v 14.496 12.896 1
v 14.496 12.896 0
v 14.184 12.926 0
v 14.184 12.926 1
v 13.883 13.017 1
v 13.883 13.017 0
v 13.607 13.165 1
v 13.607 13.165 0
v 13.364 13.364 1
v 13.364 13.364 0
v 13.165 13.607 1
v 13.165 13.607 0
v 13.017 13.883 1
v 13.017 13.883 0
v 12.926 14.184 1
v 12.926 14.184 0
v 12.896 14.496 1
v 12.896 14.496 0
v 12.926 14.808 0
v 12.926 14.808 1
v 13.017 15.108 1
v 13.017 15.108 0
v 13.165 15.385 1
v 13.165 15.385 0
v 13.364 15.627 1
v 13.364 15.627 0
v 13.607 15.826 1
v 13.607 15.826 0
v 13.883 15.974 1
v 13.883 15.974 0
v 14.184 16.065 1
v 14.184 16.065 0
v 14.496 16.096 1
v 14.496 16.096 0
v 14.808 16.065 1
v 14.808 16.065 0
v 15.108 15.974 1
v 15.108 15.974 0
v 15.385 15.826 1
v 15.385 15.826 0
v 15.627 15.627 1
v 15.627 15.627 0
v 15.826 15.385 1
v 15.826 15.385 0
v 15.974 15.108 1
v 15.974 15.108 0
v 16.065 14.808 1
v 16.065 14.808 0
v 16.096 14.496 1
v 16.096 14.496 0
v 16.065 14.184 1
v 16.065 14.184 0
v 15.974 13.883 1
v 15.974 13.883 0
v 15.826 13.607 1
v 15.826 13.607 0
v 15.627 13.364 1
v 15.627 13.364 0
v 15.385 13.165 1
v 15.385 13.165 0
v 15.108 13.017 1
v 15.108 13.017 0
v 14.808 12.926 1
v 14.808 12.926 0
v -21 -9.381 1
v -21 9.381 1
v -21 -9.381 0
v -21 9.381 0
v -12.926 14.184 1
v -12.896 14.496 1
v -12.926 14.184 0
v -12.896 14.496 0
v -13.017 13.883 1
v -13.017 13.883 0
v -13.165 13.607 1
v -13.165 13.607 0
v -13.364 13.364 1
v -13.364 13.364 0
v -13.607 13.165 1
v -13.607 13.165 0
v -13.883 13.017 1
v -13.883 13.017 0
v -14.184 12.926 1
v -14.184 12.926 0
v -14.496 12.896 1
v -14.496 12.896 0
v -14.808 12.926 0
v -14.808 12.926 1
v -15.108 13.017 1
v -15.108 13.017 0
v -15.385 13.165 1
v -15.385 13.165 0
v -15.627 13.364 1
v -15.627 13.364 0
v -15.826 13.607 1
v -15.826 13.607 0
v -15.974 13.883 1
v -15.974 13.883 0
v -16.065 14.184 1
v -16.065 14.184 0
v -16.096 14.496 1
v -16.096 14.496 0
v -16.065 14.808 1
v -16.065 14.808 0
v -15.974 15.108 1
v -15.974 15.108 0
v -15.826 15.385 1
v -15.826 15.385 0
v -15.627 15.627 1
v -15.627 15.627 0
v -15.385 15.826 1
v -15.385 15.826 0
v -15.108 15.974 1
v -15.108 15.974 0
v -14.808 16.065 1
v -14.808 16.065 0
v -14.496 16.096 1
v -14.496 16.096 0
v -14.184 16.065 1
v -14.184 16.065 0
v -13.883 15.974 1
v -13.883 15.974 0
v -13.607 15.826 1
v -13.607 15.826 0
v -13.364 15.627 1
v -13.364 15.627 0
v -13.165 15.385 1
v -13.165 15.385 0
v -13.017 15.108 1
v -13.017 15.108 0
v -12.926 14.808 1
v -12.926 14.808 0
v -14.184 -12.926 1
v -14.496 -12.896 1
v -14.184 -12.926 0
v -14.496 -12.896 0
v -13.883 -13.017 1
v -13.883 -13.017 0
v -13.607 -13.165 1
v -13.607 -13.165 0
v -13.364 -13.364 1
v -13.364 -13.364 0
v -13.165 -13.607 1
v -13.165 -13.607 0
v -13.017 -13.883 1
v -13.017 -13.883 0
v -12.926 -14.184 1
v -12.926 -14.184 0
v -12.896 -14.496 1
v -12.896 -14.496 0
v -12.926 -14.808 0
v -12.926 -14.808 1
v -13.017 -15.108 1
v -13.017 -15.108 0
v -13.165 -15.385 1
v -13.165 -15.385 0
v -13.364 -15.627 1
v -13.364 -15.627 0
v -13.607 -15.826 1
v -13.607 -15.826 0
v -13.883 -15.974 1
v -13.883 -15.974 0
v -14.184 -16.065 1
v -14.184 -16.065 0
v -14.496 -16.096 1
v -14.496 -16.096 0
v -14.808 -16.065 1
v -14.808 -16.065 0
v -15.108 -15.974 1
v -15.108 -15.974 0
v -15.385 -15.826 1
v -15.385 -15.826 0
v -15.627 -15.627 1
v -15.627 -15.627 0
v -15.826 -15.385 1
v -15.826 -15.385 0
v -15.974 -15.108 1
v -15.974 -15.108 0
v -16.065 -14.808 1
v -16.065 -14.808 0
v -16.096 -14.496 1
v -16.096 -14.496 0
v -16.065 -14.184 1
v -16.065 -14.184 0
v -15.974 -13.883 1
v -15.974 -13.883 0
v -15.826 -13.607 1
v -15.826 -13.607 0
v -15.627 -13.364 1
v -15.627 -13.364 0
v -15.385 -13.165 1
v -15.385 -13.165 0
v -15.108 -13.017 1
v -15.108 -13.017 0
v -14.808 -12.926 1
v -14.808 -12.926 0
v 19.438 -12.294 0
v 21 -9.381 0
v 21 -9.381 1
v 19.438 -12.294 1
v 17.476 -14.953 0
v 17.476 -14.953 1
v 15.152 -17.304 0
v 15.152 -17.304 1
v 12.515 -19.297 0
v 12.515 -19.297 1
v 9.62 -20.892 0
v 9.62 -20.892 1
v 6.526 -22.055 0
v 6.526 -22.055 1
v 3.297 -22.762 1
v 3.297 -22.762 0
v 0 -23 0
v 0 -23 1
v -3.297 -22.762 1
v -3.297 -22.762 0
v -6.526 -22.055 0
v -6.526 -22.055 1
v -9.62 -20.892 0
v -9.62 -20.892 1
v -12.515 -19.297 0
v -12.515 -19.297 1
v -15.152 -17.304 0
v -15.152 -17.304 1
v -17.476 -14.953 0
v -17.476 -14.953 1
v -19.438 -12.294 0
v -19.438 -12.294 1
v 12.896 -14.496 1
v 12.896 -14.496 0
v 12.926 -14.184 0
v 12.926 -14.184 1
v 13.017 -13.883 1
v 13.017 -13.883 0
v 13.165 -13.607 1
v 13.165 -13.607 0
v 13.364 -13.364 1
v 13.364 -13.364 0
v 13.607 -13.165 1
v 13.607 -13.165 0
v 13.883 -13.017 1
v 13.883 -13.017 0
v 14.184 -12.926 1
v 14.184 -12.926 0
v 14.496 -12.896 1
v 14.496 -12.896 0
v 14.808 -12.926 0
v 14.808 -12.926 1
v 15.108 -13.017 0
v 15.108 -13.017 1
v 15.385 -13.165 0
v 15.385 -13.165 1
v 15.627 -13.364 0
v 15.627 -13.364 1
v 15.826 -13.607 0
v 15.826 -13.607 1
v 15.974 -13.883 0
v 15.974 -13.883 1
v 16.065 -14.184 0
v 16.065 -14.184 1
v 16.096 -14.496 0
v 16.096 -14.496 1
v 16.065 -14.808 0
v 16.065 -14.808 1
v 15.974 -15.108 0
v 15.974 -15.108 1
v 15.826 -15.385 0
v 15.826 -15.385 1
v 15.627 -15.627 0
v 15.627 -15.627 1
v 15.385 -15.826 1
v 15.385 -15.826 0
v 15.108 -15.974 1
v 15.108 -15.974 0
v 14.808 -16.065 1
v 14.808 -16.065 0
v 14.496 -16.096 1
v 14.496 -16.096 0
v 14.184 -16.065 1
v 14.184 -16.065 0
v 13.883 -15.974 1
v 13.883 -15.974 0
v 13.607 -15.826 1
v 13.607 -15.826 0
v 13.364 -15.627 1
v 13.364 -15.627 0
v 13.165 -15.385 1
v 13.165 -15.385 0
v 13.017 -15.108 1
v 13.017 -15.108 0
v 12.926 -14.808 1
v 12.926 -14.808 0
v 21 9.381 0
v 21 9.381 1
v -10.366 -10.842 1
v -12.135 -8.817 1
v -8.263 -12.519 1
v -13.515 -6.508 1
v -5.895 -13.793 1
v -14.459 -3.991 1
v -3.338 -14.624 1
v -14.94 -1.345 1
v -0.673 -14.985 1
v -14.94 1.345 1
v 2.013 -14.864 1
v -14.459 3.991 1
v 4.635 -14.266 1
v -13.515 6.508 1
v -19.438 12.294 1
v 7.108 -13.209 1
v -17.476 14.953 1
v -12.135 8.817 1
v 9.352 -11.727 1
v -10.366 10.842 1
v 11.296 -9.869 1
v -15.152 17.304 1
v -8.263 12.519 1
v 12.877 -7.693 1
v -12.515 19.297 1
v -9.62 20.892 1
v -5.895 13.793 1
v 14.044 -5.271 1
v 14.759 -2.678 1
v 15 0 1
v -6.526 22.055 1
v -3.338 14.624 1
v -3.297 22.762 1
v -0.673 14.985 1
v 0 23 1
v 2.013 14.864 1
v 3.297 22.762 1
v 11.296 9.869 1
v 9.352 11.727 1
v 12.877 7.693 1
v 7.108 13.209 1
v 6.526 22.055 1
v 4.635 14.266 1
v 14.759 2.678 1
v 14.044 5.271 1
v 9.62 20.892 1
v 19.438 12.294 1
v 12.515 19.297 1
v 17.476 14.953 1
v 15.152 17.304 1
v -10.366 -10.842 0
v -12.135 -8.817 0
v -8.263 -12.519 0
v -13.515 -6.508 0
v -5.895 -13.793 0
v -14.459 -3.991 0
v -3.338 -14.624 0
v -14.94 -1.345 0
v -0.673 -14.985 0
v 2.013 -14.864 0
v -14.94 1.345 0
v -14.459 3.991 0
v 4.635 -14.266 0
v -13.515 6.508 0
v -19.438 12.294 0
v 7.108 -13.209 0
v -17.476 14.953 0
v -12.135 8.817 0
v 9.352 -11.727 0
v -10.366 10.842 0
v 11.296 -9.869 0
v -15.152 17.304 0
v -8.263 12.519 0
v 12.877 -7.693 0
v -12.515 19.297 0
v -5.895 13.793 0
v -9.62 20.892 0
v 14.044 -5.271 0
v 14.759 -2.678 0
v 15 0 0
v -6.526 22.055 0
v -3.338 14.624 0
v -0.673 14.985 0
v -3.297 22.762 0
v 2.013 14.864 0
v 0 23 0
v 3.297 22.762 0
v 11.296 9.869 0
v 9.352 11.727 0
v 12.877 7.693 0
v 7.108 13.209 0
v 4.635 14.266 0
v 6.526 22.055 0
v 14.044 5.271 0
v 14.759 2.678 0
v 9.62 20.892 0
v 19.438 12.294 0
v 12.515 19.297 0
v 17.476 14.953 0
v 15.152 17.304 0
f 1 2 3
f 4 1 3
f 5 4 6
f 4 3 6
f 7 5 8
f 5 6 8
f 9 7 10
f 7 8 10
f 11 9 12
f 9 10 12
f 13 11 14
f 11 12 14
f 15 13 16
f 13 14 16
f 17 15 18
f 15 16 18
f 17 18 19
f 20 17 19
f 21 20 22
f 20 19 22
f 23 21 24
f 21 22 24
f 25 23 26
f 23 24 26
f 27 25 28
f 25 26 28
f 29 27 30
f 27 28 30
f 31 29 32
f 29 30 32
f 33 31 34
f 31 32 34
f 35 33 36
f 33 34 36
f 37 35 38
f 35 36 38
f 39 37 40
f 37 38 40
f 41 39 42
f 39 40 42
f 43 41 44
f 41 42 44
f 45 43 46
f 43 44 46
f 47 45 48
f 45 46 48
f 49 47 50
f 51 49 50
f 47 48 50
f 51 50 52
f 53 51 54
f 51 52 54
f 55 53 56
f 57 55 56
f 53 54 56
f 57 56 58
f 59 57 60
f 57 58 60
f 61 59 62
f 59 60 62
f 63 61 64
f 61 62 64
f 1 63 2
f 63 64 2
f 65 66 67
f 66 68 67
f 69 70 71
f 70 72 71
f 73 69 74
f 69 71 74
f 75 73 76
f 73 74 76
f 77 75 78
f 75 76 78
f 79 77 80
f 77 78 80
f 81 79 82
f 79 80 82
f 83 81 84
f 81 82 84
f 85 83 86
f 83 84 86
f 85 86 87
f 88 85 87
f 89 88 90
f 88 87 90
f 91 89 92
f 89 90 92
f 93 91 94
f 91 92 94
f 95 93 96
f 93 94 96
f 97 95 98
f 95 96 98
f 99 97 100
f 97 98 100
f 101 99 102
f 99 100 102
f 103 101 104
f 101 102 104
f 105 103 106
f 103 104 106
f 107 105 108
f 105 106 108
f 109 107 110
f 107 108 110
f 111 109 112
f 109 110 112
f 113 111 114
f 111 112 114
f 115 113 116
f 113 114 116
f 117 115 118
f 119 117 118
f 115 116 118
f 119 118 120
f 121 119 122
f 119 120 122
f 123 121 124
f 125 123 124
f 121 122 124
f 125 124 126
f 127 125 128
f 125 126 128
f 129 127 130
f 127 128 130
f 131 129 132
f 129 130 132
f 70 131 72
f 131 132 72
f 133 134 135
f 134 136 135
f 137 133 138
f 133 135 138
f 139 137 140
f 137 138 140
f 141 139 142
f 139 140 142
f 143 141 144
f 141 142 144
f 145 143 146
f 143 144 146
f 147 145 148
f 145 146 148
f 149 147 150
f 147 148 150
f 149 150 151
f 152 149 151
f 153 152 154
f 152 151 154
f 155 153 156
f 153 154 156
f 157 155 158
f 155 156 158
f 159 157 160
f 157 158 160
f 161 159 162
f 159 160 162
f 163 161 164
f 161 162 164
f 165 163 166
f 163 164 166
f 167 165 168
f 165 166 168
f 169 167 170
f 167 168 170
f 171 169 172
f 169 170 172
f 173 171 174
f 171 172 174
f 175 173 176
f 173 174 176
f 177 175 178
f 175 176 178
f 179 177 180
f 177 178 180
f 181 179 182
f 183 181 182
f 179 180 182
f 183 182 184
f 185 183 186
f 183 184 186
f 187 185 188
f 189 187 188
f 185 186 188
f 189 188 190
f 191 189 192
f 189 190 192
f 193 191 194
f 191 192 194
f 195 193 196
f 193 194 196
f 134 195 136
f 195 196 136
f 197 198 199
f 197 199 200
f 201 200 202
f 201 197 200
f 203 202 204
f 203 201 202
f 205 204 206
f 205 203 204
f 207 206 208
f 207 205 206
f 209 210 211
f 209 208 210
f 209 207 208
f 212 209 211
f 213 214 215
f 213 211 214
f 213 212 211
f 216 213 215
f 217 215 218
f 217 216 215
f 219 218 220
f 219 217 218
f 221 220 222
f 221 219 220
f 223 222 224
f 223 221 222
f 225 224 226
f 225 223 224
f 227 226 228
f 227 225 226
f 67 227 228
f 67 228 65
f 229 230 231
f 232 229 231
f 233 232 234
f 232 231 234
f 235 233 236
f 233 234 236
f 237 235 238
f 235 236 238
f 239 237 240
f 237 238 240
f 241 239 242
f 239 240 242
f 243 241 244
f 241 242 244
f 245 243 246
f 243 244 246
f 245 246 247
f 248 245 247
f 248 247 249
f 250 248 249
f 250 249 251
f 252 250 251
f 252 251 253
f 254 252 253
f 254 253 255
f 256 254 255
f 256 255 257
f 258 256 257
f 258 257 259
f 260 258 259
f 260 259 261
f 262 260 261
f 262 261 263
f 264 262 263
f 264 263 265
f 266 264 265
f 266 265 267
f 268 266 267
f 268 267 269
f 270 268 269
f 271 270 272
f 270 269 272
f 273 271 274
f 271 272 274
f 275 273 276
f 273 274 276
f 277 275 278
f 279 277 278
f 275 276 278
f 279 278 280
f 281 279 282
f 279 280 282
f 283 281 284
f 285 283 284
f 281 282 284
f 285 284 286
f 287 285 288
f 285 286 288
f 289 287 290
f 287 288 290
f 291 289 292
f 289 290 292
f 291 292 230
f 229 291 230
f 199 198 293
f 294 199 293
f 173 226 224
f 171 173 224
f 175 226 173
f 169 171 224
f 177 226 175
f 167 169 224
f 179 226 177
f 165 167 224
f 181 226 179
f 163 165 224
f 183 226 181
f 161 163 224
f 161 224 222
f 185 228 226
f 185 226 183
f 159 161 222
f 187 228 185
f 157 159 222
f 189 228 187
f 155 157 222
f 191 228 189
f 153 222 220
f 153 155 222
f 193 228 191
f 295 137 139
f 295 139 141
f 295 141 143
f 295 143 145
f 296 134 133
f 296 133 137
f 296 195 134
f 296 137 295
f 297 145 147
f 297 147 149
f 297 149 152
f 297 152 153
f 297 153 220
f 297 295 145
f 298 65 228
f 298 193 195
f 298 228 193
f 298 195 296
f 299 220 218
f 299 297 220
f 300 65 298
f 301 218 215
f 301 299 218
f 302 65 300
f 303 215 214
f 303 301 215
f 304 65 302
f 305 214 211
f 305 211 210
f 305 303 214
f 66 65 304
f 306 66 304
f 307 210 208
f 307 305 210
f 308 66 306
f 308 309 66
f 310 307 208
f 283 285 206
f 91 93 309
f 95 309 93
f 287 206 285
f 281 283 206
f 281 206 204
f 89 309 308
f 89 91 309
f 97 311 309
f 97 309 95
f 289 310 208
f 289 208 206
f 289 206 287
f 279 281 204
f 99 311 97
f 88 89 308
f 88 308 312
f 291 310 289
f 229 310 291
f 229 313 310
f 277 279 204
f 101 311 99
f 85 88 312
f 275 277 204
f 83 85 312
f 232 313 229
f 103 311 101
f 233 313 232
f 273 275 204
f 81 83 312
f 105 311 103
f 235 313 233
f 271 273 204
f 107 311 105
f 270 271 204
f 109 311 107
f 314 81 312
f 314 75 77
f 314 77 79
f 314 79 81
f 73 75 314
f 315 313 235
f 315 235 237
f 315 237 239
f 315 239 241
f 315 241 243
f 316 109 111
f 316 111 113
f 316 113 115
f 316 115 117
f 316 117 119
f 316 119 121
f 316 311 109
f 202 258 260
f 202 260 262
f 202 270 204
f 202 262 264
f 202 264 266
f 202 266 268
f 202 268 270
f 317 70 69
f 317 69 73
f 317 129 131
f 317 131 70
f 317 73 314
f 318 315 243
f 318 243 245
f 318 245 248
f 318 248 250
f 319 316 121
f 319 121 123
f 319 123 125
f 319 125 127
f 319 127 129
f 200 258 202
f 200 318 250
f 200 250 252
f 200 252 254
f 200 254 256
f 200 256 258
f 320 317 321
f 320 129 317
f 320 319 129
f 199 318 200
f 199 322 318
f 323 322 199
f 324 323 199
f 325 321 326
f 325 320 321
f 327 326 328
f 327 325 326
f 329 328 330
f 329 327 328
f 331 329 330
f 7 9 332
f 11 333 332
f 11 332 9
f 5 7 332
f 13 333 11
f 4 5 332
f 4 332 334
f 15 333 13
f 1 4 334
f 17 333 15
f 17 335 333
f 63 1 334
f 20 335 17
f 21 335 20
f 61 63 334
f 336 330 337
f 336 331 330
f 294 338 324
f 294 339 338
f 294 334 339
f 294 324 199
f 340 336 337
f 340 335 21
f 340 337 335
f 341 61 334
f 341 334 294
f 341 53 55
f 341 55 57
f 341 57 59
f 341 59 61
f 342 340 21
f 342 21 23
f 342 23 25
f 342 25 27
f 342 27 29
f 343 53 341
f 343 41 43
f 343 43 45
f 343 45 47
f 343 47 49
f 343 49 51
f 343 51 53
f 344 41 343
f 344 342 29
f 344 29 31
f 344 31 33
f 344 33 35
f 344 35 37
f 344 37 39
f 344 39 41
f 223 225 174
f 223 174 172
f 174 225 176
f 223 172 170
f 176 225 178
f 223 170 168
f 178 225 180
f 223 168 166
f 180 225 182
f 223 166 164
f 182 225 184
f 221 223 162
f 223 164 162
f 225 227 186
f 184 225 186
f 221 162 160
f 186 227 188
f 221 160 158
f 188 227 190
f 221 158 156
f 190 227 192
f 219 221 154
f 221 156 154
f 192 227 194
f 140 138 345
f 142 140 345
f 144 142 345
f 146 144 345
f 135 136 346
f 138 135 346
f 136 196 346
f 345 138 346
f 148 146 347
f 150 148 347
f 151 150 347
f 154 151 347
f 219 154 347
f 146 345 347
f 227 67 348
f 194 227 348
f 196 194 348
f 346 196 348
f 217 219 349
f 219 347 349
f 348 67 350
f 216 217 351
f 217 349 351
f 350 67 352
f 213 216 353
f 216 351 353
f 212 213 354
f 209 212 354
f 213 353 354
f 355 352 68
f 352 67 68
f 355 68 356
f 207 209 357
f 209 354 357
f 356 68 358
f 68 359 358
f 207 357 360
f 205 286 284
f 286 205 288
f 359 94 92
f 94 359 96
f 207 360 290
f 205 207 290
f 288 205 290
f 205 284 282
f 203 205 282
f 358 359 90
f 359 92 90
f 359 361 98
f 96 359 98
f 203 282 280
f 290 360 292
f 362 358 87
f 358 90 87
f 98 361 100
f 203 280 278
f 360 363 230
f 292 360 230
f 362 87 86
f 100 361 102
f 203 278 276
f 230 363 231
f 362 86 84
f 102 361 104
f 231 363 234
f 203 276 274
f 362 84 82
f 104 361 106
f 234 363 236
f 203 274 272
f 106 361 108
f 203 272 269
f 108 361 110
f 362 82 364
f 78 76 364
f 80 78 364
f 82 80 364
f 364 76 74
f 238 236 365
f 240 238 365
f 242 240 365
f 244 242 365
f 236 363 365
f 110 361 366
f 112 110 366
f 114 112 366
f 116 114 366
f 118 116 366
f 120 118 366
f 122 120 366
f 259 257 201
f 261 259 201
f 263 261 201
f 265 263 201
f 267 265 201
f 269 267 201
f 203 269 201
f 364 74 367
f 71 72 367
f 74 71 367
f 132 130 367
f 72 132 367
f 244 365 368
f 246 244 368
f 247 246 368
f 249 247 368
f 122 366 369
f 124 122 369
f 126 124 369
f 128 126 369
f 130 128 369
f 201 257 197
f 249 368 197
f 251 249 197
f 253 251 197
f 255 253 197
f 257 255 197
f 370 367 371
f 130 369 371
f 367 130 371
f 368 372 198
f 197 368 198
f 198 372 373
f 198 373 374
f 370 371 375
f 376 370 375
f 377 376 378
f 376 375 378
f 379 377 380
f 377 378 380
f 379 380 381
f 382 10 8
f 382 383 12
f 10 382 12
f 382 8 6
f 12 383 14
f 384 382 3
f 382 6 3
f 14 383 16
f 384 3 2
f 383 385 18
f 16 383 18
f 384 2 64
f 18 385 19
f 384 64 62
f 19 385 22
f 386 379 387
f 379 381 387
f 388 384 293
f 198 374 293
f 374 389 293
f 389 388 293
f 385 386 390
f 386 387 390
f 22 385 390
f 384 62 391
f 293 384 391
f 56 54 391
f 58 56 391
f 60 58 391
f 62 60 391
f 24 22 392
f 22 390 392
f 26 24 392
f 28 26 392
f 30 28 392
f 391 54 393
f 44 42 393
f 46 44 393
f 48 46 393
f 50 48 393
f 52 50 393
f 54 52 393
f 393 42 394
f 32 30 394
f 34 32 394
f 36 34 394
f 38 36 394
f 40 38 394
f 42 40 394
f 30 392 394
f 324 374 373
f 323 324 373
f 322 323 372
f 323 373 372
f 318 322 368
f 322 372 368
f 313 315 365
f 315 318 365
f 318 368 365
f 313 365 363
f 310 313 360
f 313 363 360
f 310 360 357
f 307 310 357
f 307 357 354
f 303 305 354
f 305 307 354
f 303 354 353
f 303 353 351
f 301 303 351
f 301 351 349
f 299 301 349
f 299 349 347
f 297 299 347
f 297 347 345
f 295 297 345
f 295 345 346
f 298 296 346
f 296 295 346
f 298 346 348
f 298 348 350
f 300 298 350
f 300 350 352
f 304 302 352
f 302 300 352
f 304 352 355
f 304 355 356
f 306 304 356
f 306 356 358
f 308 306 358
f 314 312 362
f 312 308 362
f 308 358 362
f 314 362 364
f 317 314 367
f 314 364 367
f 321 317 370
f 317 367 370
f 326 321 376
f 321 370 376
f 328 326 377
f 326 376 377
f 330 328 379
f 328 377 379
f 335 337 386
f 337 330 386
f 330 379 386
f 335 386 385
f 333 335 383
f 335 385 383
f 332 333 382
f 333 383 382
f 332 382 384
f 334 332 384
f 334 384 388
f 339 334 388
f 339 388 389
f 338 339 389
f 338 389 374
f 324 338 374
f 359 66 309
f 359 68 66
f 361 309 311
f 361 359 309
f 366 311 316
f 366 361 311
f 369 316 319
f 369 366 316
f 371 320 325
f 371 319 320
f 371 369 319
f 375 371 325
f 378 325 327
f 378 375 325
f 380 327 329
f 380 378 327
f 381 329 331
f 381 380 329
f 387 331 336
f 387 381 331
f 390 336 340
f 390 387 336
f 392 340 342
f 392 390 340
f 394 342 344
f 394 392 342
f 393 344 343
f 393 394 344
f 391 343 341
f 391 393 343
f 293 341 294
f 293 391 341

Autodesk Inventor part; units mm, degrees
ref_plane "YZ Plane" through (0, 0, 0) normal (1, 0, 0) x (0, 1, 0)
ref_plane "XZ Plane" through (0, 0, 0) normal (0, 1, 0) x (-1, 0, 0)
ref_plane "XY Plane" through (0, 0, 0) normal (0, 0, 1) x (1, 0, 0)
sketch "Sketch1" plane through (0, 0, 0) normal (0, 0, 1) x (1, 0, 0)
  circle A0 centre (0, 0) radius 15
  circle A1 centre (0, 0) radius 23
  dimension "d0" = 30
  dimension "d1" = 46
extrude "Extrusion1" add sketch "Sketch1" along normal blind 1
sketch "Sketch2" plane through (0, 0, 1) normal (0, 0, 1) x (1, 0, 0)
  line L0 (0, 0) -> (23, 0) construction
  circle A0 centre (0, 0) radius 23 projected
  circle A1 centre (0, 0) radius 20.5 construction
  line L1 (0, 0) -> (14.4957, 14.4957) construction
  dimension "d35" = 41
  dimension "d34" = 45
hole "For-m3-screws" at (14.4957, 14.4957, 1) direction (0, 0, -1) diameter 3.2 end through all
pattern_circular "Circular Pattern1" count 4 over 360 about axis through (0, 0, 0) along (0, 0, 1) of "For-m3-screws"
sketch "Sketch4" plane through (0, 0, 0) normal (0, 0, 1) x (1, 0, 0)
  line L0 (21, 30) -> (26, 30)
  line L1 (26, 30) -> (26, -30)
  line L2 (26, -30) -> (21, -30)
  line L3 (21, -30) -> (21, 30)
  point P0 (0, 0)
  point P1 (26, 0)
  dimension "d19" = 21
  dimension "d20" = 60
  dimension "d21" = 5
extrude "Extrusion3" cut sketch "Sketch4" along normal blind 10
mirror "Mirror1" about plane through (0, 0, 0) normal (1, 0, 0) of "Extrusion3"
equation "\"d0\" = innerdiameter"
equation "\"d1\" = outerdiameter"
equation "\"d35\" = holepositiondiameter"
equation "\"d19\" = trimspan"
equation "\"outerdiameter\" = 46"
equation "\"innerdiameter\" = 30"
equation "\"holepositiondiameter\" = 41"
equation "\"trimspan\" = 21"
properties part number "boron window" material "Stainless Steel"
